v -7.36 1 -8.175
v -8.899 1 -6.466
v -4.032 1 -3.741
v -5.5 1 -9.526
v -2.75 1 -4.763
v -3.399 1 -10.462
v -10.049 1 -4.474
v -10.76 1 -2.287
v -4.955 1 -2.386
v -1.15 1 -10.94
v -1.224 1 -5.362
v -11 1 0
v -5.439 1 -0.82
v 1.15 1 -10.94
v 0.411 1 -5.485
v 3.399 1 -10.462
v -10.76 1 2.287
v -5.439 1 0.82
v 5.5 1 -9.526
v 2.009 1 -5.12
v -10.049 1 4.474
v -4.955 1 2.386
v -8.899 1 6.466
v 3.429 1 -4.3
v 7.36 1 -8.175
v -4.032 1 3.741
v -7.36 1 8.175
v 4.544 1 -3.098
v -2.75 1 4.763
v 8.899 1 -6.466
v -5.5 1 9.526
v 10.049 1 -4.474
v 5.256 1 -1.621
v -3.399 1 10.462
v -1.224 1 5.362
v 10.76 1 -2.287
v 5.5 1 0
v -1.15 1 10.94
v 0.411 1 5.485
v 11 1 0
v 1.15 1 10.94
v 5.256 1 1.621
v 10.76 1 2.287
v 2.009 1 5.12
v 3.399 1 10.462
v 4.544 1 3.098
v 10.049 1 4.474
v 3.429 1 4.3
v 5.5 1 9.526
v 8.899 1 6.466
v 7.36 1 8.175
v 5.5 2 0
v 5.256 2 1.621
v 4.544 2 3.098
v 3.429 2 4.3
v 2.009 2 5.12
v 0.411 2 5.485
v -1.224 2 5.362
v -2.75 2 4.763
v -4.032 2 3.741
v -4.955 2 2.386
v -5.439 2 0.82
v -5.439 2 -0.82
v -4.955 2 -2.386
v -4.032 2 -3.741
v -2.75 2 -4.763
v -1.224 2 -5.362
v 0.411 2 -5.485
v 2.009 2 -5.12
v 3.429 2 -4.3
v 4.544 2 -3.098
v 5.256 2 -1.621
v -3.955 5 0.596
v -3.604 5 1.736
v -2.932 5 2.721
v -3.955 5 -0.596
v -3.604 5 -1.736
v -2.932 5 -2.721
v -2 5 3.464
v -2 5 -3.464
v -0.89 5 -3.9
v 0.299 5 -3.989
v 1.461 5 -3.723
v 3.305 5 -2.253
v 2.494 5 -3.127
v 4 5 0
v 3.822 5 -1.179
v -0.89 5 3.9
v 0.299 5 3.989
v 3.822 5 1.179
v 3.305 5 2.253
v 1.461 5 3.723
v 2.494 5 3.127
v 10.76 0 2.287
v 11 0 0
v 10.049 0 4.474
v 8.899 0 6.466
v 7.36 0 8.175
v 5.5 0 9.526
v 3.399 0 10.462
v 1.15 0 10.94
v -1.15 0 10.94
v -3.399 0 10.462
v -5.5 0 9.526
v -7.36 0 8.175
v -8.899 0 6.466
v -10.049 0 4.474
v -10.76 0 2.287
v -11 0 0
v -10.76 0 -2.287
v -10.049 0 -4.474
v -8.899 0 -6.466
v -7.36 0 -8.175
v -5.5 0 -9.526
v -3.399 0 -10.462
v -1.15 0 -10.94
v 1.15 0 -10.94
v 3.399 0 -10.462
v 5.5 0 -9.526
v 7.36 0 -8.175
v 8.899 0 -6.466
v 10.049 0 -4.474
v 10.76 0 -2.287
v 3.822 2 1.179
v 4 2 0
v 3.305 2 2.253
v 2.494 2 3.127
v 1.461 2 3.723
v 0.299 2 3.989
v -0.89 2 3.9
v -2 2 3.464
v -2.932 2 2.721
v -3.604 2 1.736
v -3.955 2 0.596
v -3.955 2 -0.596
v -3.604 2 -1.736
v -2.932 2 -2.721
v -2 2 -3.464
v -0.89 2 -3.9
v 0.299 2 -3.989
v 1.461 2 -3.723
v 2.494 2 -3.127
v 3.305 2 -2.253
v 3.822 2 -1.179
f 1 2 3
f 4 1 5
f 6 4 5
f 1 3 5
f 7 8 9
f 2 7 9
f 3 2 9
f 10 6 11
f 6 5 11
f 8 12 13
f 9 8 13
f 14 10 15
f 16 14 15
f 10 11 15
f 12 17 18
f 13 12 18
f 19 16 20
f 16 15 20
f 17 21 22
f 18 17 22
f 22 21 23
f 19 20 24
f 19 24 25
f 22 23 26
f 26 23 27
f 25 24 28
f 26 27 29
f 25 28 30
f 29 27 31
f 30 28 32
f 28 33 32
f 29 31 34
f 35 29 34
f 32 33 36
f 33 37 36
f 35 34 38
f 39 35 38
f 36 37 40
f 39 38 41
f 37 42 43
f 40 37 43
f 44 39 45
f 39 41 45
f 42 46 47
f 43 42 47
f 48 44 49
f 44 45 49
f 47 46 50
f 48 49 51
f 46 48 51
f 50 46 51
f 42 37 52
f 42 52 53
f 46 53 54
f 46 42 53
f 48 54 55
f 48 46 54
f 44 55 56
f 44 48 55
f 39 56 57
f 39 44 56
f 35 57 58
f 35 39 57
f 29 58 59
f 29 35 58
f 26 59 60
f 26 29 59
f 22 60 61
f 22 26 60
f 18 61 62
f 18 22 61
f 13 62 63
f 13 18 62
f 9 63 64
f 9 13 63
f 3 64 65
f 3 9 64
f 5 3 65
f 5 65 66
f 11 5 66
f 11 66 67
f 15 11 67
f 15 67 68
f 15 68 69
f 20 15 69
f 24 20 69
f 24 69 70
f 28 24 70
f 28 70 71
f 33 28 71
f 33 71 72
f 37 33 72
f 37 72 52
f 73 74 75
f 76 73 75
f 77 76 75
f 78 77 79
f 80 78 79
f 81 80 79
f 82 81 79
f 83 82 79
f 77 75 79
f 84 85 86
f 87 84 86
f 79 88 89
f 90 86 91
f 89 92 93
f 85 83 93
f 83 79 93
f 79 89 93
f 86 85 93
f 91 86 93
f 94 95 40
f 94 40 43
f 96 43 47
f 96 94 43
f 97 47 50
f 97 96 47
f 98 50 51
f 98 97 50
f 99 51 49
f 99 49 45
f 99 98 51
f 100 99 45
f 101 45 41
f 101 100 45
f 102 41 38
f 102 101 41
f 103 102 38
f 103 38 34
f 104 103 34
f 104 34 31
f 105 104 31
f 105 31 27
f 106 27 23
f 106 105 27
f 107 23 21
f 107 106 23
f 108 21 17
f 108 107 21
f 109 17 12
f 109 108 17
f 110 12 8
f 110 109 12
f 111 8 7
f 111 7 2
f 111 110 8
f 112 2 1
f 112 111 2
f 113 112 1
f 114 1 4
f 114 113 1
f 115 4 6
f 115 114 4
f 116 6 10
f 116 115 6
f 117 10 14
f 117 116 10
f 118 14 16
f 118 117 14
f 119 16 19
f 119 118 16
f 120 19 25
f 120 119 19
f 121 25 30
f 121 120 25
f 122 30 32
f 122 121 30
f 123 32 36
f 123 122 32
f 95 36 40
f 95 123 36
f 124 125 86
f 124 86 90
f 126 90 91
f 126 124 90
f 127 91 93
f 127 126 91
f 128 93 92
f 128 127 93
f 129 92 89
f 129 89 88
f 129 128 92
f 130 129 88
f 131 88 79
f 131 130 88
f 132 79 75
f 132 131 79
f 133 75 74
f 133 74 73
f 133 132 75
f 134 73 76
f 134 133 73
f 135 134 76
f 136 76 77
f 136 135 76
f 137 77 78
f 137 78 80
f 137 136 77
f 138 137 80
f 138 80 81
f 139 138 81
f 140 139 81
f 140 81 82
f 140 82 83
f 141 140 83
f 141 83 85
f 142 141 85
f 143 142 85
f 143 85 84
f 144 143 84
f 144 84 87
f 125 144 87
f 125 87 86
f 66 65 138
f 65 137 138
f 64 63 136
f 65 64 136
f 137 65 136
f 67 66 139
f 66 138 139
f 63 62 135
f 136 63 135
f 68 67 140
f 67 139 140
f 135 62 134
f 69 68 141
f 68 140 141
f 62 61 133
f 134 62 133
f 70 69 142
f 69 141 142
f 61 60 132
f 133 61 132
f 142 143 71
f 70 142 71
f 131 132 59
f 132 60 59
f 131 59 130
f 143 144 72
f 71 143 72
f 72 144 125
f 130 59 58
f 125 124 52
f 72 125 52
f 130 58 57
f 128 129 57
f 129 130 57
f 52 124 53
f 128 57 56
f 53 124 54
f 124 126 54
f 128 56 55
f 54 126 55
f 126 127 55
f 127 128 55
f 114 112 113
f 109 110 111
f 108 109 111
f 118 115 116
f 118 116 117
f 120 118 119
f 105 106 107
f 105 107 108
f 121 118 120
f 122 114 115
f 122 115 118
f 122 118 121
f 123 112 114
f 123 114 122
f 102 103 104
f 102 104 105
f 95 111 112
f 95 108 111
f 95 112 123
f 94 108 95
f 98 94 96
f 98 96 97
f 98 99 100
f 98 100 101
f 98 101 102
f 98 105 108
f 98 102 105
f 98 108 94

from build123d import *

# Parameters (mm, degrees)
F0_R     = 11
F0_R_2   = 5.5
F1_DEPTH = 1
F0_R_3   = 4
F2_DEPTH = 2
F3_DEPTH = 5


with BuildPart() as f1:
    # F0 (on Front) → F1 (new body)
    with BuildSketch(Plane.XZ):
        Circle(F0_R)
        Circle(F0_R_2, mode=Mode.SUBTRACT)
    extrude(amount=-F1_DEPTH)

    # F0 (on Front) → F2 (join)
    with BuildSketch(Plane.XZ):
        Circle(F0_R_2)
        Circle(F0_R_3, mode=Mode.SUBTRACT)
    extrude(amount=-F2_DEPTH)

    # F0 (on Front) → F3 (join)
    with BuildSketch(Plane.XZ):
        Circle(F0_R_3)
    extrude(amount=-F3_DEPTH)


solid = f1.part
